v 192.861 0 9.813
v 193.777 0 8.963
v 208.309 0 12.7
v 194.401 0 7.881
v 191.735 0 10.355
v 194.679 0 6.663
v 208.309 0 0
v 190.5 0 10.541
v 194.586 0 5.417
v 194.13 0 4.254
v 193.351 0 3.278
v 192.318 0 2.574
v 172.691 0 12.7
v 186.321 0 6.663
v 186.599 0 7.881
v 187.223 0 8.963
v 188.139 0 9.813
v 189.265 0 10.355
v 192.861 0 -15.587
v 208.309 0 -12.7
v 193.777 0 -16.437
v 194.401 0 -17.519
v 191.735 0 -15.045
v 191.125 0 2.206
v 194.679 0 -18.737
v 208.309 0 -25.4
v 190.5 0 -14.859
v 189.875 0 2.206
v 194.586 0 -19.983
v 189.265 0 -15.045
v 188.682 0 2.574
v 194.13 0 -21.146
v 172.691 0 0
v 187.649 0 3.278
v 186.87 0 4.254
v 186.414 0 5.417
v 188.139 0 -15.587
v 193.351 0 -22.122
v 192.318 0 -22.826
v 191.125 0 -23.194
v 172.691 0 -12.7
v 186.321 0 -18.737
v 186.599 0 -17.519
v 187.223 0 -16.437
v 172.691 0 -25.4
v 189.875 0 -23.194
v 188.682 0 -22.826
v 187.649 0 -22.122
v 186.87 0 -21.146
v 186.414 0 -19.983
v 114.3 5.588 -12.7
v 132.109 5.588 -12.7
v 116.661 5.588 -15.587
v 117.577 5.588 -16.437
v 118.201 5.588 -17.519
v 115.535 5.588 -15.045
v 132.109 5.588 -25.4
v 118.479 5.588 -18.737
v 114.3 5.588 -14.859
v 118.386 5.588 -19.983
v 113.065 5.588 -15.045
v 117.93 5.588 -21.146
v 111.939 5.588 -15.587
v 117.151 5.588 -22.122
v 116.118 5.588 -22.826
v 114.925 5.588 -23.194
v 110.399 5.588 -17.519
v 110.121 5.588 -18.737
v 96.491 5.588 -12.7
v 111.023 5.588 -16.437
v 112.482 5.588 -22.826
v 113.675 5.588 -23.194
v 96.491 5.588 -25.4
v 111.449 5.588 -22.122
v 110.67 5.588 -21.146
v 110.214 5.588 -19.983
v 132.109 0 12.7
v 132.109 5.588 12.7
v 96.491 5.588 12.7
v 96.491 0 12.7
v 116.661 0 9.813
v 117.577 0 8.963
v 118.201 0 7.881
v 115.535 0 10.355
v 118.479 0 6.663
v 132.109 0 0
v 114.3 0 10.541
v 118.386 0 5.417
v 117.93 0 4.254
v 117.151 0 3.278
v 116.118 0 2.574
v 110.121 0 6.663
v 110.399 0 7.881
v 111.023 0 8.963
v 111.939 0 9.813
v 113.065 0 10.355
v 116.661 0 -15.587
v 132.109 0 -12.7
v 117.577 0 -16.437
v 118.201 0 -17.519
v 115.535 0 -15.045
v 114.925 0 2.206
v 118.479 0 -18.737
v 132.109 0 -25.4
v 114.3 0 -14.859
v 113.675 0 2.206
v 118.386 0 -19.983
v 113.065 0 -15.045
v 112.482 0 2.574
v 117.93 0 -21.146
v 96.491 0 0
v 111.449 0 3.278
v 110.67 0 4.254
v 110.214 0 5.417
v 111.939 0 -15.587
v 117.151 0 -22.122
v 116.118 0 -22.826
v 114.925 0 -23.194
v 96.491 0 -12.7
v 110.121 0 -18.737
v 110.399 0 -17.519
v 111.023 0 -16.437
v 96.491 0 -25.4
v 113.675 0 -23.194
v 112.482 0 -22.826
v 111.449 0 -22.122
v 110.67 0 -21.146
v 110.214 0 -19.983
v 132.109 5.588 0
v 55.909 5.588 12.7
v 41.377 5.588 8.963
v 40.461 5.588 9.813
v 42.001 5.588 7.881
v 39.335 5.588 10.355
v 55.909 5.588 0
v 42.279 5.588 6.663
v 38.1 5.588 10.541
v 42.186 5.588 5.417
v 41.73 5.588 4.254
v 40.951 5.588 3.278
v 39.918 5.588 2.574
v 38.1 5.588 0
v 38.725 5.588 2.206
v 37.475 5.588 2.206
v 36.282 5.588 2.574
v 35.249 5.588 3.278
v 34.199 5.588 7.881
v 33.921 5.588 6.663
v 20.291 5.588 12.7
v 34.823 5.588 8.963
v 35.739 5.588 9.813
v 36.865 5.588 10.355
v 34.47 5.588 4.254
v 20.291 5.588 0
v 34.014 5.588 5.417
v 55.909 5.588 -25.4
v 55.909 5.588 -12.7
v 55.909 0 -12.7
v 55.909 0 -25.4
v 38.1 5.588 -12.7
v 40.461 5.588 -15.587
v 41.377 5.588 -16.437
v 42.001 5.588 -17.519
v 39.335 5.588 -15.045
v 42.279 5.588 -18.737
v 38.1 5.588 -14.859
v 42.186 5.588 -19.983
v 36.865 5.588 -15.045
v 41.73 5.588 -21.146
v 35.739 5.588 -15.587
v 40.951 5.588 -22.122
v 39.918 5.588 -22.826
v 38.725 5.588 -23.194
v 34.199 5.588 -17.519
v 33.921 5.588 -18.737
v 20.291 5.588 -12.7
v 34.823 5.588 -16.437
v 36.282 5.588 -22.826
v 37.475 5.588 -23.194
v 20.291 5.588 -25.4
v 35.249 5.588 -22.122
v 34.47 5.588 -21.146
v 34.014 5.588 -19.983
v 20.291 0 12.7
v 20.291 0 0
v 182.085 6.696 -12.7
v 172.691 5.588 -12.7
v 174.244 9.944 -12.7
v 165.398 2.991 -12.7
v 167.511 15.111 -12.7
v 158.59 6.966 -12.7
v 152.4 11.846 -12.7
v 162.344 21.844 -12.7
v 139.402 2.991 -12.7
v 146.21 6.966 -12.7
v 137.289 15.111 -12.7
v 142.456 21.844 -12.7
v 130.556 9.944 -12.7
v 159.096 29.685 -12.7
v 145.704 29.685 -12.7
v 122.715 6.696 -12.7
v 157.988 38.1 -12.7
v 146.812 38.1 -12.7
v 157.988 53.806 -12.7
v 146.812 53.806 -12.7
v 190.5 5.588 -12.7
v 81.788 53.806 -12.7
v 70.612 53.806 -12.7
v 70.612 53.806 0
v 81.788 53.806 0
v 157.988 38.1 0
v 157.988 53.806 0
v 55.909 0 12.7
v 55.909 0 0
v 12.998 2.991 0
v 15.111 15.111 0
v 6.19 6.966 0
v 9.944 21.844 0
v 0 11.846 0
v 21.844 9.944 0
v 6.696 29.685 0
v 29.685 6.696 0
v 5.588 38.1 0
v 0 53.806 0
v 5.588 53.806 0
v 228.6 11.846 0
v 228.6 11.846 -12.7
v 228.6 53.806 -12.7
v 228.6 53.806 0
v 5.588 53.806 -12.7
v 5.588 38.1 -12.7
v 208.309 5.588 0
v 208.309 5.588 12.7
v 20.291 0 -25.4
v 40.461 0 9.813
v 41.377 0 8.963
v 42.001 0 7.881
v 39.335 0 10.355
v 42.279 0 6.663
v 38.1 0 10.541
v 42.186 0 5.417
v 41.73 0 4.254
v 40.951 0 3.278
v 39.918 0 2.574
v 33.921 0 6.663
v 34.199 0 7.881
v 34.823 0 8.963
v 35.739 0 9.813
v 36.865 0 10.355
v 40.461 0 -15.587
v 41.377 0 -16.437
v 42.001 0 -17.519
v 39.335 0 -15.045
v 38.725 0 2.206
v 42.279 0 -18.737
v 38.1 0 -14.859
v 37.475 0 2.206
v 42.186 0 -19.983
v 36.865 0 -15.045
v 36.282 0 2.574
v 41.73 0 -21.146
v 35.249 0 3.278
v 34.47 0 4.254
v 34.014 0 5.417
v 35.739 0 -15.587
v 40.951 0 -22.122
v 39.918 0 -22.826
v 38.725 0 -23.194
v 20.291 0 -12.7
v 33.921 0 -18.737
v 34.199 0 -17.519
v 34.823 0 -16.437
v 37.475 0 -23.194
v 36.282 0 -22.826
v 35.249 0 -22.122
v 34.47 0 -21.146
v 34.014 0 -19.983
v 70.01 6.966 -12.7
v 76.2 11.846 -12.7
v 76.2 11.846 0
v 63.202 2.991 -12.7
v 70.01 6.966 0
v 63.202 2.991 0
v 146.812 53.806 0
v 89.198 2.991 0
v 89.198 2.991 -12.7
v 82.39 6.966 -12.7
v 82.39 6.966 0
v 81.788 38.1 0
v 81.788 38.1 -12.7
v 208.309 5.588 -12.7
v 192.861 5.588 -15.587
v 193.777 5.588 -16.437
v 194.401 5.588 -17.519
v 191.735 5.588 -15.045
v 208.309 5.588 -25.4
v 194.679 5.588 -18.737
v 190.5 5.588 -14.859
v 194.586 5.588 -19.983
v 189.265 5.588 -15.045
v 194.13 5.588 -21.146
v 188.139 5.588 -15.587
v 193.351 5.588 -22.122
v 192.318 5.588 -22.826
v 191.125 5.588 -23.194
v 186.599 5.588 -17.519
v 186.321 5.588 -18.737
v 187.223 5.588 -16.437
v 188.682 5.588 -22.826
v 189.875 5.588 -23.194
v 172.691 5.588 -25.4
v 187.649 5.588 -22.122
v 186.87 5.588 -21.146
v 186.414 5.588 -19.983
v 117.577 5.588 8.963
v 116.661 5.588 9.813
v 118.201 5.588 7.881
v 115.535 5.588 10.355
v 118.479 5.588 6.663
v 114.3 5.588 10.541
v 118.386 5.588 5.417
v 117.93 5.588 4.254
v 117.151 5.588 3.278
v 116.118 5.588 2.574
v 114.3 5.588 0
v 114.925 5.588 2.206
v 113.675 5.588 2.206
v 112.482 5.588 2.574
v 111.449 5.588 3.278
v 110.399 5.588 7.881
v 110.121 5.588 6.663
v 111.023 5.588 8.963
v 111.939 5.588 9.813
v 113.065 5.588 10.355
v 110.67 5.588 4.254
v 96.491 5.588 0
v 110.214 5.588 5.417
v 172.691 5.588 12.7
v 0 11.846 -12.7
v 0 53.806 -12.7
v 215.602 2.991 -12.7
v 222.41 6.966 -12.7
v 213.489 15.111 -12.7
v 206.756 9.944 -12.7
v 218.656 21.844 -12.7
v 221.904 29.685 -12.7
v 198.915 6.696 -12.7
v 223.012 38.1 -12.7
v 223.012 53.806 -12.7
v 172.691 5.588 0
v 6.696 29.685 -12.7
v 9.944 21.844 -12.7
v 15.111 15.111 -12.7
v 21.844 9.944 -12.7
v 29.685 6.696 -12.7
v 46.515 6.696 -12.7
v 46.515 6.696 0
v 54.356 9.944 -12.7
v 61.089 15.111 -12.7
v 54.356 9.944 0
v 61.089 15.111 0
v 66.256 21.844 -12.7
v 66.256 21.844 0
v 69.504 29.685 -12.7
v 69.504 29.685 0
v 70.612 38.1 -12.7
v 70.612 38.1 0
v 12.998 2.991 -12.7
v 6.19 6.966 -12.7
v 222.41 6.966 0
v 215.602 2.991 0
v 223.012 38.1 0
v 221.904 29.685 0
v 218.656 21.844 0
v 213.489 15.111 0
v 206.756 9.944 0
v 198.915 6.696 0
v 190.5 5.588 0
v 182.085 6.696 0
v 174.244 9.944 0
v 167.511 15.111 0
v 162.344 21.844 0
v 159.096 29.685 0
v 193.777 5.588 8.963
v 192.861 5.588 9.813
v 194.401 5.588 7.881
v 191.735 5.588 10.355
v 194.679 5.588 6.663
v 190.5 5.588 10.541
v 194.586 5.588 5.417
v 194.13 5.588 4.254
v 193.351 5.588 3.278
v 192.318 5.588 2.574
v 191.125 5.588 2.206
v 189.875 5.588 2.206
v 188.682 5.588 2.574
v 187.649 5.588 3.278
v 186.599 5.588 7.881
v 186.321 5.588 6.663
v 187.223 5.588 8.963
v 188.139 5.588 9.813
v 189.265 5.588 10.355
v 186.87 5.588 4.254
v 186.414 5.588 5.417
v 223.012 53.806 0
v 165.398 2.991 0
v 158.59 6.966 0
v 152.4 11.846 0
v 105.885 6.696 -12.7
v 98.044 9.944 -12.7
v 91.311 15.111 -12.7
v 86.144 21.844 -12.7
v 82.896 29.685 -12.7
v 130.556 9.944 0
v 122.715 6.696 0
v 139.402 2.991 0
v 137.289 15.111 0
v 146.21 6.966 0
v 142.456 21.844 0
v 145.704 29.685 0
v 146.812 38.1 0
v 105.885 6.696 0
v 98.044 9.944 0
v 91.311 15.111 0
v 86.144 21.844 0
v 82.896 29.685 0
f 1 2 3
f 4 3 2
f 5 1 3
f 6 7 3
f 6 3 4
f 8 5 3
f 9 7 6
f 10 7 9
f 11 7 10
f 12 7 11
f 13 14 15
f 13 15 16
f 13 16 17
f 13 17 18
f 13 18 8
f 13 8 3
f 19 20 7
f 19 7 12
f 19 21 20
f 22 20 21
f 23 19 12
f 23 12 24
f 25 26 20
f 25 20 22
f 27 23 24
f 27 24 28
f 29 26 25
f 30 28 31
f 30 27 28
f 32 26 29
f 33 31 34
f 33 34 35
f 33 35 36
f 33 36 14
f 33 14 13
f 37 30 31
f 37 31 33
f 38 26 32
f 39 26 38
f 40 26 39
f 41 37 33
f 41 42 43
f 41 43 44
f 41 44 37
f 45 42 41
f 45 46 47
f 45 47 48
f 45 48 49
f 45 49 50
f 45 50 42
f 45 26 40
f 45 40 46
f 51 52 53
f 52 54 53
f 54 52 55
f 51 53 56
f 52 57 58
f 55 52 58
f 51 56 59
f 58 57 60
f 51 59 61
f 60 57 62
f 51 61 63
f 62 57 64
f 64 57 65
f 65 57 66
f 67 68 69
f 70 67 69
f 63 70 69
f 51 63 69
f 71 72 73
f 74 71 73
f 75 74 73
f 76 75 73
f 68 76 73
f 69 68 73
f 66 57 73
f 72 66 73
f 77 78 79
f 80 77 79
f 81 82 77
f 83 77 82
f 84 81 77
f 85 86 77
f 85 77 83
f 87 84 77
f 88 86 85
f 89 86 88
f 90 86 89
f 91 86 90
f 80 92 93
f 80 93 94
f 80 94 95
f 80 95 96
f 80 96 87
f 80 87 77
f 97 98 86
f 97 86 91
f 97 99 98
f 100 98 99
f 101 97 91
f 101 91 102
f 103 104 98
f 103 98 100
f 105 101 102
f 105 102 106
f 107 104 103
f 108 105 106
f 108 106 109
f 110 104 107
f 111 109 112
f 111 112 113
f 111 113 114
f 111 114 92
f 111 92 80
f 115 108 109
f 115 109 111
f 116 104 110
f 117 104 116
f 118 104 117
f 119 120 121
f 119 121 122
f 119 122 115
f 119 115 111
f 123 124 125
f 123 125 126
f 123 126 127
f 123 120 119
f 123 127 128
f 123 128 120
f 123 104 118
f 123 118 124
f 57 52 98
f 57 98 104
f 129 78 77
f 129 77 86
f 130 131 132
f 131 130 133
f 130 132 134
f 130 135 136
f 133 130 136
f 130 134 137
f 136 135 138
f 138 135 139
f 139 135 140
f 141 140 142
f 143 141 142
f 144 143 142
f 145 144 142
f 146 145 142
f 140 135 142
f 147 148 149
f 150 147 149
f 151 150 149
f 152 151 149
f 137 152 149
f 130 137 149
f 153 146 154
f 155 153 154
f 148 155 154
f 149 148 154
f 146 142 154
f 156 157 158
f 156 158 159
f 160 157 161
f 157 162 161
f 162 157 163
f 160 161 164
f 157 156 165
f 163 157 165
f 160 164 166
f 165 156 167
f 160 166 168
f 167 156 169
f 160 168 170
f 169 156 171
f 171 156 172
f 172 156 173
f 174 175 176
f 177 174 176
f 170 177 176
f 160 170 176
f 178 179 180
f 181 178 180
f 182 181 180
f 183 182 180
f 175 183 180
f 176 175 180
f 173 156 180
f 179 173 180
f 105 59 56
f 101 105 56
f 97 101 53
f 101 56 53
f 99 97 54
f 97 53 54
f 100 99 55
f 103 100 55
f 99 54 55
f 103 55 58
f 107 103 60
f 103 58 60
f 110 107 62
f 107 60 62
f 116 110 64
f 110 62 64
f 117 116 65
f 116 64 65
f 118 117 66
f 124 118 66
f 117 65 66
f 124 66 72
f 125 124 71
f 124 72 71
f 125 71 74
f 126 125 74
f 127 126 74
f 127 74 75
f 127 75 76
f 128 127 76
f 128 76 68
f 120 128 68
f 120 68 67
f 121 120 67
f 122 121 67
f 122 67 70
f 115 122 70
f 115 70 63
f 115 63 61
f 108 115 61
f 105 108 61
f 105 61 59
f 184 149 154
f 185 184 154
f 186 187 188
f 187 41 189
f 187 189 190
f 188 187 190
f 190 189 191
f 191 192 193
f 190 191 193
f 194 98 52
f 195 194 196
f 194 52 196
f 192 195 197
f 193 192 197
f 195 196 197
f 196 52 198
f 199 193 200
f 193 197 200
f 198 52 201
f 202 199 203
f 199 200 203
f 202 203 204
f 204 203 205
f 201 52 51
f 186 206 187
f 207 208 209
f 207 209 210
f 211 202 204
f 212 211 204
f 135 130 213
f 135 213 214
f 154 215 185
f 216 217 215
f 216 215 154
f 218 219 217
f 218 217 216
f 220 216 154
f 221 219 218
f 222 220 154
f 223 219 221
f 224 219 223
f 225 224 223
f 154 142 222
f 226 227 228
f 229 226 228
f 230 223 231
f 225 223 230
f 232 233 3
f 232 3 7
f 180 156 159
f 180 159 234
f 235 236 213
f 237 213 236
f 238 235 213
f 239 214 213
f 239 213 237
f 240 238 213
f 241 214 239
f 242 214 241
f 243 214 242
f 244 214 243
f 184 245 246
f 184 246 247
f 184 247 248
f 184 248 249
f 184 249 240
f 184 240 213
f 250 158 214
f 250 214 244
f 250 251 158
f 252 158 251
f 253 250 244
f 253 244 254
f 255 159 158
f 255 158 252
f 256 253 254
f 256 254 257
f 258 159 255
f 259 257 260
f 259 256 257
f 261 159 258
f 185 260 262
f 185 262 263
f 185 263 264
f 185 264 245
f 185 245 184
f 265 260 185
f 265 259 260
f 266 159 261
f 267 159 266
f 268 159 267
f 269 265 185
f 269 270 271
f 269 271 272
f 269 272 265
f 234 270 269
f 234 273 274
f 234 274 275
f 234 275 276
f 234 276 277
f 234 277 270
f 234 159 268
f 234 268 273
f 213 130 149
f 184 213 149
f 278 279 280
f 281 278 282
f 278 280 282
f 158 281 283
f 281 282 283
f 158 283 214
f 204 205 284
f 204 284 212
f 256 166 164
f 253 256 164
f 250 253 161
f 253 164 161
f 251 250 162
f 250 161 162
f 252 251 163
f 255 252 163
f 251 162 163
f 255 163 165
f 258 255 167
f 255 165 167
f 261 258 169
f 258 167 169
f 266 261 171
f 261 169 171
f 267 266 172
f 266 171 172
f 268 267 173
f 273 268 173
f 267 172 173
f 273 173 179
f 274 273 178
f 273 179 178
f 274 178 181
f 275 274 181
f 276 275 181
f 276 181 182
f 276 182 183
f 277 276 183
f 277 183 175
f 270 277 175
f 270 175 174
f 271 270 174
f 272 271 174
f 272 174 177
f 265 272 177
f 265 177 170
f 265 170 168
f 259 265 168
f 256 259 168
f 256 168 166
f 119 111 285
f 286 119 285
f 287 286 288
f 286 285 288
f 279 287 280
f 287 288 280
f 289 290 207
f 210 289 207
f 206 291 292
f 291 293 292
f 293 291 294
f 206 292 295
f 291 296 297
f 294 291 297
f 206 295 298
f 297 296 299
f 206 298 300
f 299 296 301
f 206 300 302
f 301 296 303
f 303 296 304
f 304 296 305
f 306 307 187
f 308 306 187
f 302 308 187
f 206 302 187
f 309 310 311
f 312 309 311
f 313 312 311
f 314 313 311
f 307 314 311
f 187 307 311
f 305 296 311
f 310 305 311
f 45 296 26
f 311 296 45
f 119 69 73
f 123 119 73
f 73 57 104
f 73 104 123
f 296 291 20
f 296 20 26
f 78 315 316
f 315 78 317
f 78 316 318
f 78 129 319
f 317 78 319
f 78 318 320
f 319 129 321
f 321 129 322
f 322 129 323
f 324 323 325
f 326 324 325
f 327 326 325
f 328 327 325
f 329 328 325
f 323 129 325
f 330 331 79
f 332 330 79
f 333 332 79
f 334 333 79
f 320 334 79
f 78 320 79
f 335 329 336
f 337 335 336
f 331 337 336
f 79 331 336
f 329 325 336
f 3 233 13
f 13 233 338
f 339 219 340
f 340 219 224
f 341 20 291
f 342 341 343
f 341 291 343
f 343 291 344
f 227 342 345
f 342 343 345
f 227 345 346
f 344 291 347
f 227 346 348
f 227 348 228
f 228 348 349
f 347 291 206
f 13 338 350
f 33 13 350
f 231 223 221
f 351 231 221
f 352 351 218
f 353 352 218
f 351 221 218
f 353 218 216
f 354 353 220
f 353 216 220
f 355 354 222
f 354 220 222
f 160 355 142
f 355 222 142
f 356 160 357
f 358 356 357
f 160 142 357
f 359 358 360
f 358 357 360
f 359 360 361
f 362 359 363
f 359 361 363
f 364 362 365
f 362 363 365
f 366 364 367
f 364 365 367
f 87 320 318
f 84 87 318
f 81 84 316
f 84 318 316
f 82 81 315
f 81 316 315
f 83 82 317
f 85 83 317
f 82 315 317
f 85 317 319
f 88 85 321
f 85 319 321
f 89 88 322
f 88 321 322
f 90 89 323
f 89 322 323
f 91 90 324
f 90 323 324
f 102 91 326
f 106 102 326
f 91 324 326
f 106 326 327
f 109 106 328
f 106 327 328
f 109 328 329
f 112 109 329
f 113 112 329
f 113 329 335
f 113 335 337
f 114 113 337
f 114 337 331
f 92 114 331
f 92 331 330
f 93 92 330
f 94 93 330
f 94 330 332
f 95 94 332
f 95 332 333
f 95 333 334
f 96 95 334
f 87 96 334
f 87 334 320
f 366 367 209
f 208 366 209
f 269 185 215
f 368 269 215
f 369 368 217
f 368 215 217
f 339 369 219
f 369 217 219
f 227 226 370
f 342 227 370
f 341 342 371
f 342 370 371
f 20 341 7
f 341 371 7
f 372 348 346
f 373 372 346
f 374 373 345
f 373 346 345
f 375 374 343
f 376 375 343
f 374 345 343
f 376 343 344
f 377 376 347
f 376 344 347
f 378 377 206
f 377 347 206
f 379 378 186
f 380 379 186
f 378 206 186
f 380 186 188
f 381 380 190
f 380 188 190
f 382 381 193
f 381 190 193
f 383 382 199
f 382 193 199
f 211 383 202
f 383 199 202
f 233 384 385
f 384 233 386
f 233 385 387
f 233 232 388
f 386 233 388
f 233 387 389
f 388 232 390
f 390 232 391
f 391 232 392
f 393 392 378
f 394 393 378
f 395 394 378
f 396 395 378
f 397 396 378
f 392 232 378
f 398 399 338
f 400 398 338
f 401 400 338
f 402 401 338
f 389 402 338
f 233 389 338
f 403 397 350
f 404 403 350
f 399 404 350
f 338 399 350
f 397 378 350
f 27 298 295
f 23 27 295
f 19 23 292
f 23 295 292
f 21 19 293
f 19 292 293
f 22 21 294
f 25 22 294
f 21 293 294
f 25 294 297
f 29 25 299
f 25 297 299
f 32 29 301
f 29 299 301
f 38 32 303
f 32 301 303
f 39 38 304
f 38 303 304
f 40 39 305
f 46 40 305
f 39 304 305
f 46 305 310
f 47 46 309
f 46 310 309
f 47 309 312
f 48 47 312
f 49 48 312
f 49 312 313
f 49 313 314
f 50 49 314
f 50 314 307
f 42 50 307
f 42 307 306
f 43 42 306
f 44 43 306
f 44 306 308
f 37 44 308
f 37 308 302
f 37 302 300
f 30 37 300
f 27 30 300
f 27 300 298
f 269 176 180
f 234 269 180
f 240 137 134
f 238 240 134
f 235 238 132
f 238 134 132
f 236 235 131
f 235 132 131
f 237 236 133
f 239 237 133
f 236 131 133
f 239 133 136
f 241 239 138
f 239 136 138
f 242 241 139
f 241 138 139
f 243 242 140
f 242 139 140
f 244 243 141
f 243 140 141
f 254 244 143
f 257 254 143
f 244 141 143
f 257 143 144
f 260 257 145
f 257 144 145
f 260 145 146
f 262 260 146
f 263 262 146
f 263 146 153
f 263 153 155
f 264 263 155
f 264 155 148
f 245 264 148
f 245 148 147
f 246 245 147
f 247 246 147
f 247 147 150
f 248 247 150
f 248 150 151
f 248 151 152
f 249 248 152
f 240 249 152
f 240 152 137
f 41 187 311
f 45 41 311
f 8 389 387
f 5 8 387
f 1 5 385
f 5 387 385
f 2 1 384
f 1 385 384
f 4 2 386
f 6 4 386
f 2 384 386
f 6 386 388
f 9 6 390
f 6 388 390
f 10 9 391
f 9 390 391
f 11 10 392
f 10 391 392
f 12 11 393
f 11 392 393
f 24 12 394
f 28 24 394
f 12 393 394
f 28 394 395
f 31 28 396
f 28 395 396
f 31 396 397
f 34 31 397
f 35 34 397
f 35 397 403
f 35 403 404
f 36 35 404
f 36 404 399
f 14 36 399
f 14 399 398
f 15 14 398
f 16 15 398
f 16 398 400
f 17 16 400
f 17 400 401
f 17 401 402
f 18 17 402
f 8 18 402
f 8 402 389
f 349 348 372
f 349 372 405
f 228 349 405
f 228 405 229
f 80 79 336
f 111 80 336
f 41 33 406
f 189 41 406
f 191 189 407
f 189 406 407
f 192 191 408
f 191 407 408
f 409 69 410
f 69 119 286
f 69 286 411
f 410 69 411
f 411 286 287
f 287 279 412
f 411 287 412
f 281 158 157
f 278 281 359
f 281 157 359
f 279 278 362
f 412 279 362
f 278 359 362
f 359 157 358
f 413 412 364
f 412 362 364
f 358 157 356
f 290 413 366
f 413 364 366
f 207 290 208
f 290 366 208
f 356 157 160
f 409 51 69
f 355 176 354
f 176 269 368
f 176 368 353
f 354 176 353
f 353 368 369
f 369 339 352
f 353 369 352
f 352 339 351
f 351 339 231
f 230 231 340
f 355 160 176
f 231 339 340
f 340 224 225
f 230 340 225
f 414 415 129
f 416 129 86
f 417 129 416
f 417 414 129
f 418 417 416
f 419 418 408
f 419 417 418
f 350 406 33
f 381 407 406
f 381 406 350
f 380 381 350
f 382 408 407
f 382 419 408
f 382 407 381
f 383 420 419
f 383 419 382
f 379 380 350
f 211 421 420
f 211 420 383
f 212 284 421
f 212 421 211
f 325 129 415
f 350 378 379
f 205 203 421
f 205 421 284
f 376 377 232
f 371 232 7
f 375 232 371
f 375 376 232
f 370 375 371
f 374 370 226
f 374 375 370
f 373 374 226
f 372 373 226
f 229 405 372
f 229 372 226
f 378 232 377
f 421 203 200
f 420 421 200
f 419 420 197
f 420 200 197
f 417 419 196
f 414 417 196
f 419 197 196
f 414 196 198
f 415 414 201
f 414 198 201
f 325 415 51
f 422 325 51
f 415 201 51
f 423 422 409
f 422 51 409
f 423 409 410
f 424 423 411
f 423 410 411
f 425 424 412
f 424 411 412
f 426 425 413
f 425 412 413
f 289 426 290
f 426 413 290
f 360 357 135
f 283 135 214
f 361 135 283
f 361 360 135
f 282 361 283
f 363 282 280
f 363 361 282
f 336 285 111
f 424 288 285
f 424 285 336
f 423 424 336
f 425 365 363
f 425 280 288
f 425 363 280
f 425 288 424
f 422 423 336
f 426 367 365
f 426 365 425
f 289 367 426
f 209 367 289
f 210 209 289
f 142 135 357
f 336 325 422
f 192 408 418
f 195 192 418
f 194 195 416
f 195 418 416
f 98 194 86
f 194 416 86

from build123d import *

# Parameters (mm, degrees)
SKETCH1_W               = 76.2
SKETCH1_H               = 228.6
BOSS_EXTRUDE1_DEPTH     = 38.1
SKETCH2_R               = 32.512
CUT_EXTRUDE2_DEPTH      = 244.959033446
SKETCH3_W               = 5.588
SKETCH3_H               = 15.705533419
BOSS_EXTRUDE2_DEPTH     = 228.6
SKETCH4_W               = 8.89
SKETCH4_H               = 5.08
CUT_EXTRUDE3_DEPTH      = 247.899646469
CRVPATTERN1_START       = -228.6
CRVPATTERN1_OUTLINE_W   = 5.588
CRVPATTERN1_OUTLINE_H   = 5.312766709
CRVPATTERN1_DEPTH       = 228.6
CRVPATTERN1_START_2     = -165.1
CRVPATTERN1_2_OUTLINE_W = 5.588
CRVPATTERN1_2_OUTLINE_H = 5.08
CRVPATTERN1_2_DEPTH     = 101.6
CRVPATTERN1_3_OUTLINE_W = 5.588
CRVPATTERN1_3_OUTLINE_H = 5.08
CRVPATTERN1_3_DEPTH     = 54.61
CRVPATTERN1_START_3     = -54.61
CRVPATTERN1_4_OUTLINE_W = 5.588
CRVPATTERN1_4_OUTLINE_H = 5.08
CRVPATTERN1_4_DEPTH     = 54.61
CRVPATTERN1_5_OUTLINE_W = 5.588
CRVPATTERN1_5_OUTLINE_H = 5.312766709
CRVPATTERN1_5_DEPTH     = 228.6
CRVPATTERN1_6_OUTLINE_W = 5.588
CRVPATTERN1_6_OUTLINE_H = 5.08
CRVPATTERN1_6_DEPTH     = 101.6
CRVPATTERN1_7_OUTLINE_W = 5.588
CRVPATTERN1_7_OUTLINE_H = 5.08
CRVPATTERN1_7_DEPTH     = 54.61
CRVPATTERN1_8_OUTLINE_W = 5.588
CRVPATTERN1_8_OUTLINE_H = 5.08
CRVPATTERN1_8_DEPTH     = 54.61
SKETCH6_W               = 215.9
SKETCH6_H               = 53.805533419
CUT_EXTRUDE4_DEPTH      = 328.736106382
CUT_EXTRUDE5_DEPTH      = 236.189892271
BOSS_EXTRUDE4_START     = -5.588
SKETCH8_W               = 35.618239262
SKETCH8_H               = 38.1
BOSS_EXTRUDE4_DEPTH     = 5.588
SKETCH9_R               = 4.191
CUT_EXTRUDE6_DEPTH      = 236.006490398


# Read off the part's stored shape, not the designer's step: CrvPattern1
with BuildPart() as part:
    # Sketch1 → Boss-Extrude1 (new body)
    with BuildSketch(Plane(origin=(0, 0, 0), x_dir=(1, 0, 0), z_dir=(0, 1, 0))):
        with Locations((38.1, 114.3)):
            Rectangle(SKETCH1_W, SKETCH1_H)
    extrude(amount=BOSS_EXTRUDE1_DEPTH)

    # Sketch2 → Cut-Extrude2 (cut, through all)
    with BuildSketch(Plane.XY):
        with Locations((38.1, 38.1)):
            Circle(SKETCH2_R)
    extrude(amount=-CUT_EXTRUDE2_DEPTH, mode=Mode.SUBTRACT)

    # Sketch3 → Boss-Extrude2 (add)
    with BuildSketch(Plane.XY):
        with Locations((2.794, 45.95276671)):
            Rectangle(SKETCH3_W, SKETCH3_H)
        with Locations((73.406, 45.95276671)):
            Rectangle(SKETCH3_W, SKETCH3_H)
    extrude(amount=-BOSS_EXTRUDE2_DEPTH)

    # Sketch4 → Cut-Extrude3 (cut, through all)
    with BuildSketch(Plane(origin=(76.2, 0, 0), x_dir=(0, 0, -1), z_dir=(1, 0, 0))):
        with Locations((59.055, 45.95276671)):
            Rectangle(SKETCH4_W, SKETCH4_H)
        with Locations((169.545, 45.95276671)):
            Rectangle(SKETCH4_W, SKETCH4_H)
    extrude(amount=-CUT_EXTRUDE3_DEPTH, mode=Mode.SUBTRACT)


with BuildPart() as body_2:
    # CrvPattern1 outline → CrvPattern1 (new body)
    with BuildSketch(Plane.XY.offset(CRVPATTERN1_START)):
        with BuildLine():
            Line((152.4, 43.41276671), (152.4, 0))
            Line((152.4, 0), (228.6, 0))
            Line((228.6, 0), (228.6, 43.41276671))
            Line((228.6, 43.41276671), (223.012, 43.41276671))
            Line((223.012, 43.41276671), (223.012, 38.1))
            ThreePointArc((223.012, 38.1), (190.5, 5.588), (157.988, 38.1))
            Line((157.988, 38.1), (157.988, 43.41276671))
            Line((157.988, 43.41276671), (152.4, 43.41276671))
        make_face()
        with Locations((155.194, 51.149150065)):
            Rectangle(CRVPATTERN1_OUTLINE_W, CRVPATTERN1_OUTLINE_H)
        with Locations((225.806, 51.149150065)):
            Rectangle(CRVPATTERN1_OUTLINE_W, CRVPATTERN1_OUTLINE_H)
    extrude(amount=CRVPATTERN1_DEPTH)

    # CrvPattern1 2 outline → CrvPattern1 2 (add)
    with BuildSketch(Plane.XY.offset(CRVPATTERN1_START_2)):
        with Locations((155.194, 45.95276671)):
            Rectangle(CRVPATTERN1_2_OUTLINE_W, CRVPATTERN1_2_OUTLINE_H)
        with Locations((225.806, 45.95276671)):
            Rectangle(CRVPATTERN1_2_OUTLINE_W, CRVPATTERN1_2_OUTLINE_H)
    extrude(amount=CRVPATTERN1_2_DEPTH)

    # CrvPattern1 3 outline → CrvPattern1 3 (add)
    with BuildSketch(Plane.XY.offset(CRVPATTERN1_START)):
        with Locations((155.194, 45.95276671)):
            Rectangle(CRVPATTERN1_3_OUTLINE_W, CRVPATTERN1_3_OUTLINE_H)
        with Locations((225.806, 45.95276671)):
            Rectangle(CRVPATTERN1_3_OUTLINE_W, CRVPATTERN1_3_OUTLINE_H)
    extrude(amount=CRVPATTERN1_3_DEPTH)

    # CrvPattern1 4 outline → CrvPattern1 4 (add)
    with BuildSketch(Plane.XY.offset(CRVPATTERN1_START_3)):
        with Locations((155.194, 45.95276671)):
            Rectangle(CRVPATTERN1_4_OUTLINE_W, CRVPATTERN1_4_OUTLINE_H)
        with Locations((225.806, 45.95276671)):
            Rectangle(CRVPATTERN1_4_OUTLINE_W, CRVPATTERN1_4_OUTLINE_H)
    extrude(amount=CRVPATTERN1_4_DEPTH)


with BuildPart() as body_3:
    # CrvPattern1 5 outline → CrvPattern1 5 (new body)
    with BuildSketch(Plane.XY.offset(CRVPATTERN1_START)):
        with BuildLine():
            Line((76.2, 43.41276671), (76.2, 0))
            Line((76.2, 0), (152.4, 0))
            Line((152.4, 0), (152.4, 43.41276671))
            Line((152.4, 43.41276671), (146.812, 43.41276671))
            Line((146.812, 43.41276671), (146.812, 38.1))
            ThreePointArc((146.812, 38.1), (114.3, 5.588), (81.788, 38.1))
            Line((81.788, 38.1), (81.788, 43.41276671))
            Line((81.788, 43.41276671), (76.2, 43.41276671))
        make_face()
        with Locations((78.994, 51.149150065)):
            Rectangle(CRVPATTERN1_5_OUTLINE_W, CRVPATTERN1_5_OUTLINE_H)
        with Locations((149.606, 51.149150065)):
            Rectangle(CRVPATTERN1_5_OUTLINE_W, CRVPATTERN1_5_OUTLINE_H)
    extrude(amount=CRVPATTERN1_5_DEPTH)

    # CrvPattern1 6 outline → CrvPattern1 6 (add)
    with BuildSketch(Plane.XY.offset(CRVPATTERN1_START_2)):
        with Locations((78.994, 45.95276671)):
            Rectangle(CRVPATTERN1_6_OUTLINE_W, CRVPATTERN1_6_OUTLINE_H)
        with Locations((149.606, 45.95276671)):
            Rectangle(CRVPATTERN1_6_OUTLINE_W, CRVPATTERN1_6_OUTLINE_H)
    extrude(amount=CRVPATTERN1_6_DEPTH)

    # CrvPattern1 7 outline → CrvPattern1 7 (add)
    with BuildSketch(Plane.XY.offset(CRVPATTERN1_START)):
        with Locations((78.994, 45.95276671)):
            Rectangle(CRVPATTERN1_7_OUTLINE_W, CRVPATTERN1_7_OUTLINE_H)
        with Locations((149.606, 45.95276671)):
            Rectangle(CRVPATTERN1_7_OUTLINE_W, CRVPATTERN1_7_OUTLINE_H)
    extrude(amount=CRVPATTERN1_7_DEPTH)

    # CrvPattern1 8 outline → CrvPattern1 8 (add)
    with BuildSketch(Plane.XY.offset(CRVPATTERN1_START_3)):
        with Locations((78.994, 45.95276671)):
            Rectangle(CRVPATTERN1_8_OUTLINE_W, CRVPATTERN1_8_OUTLINE_H)
        with Locations((149.606, 45.95276671)):
            Rectangle(CRVPATTERN1_8_OUTLINE_W, CRVPATTERN1_8_OUTLINE_H)
    extrude(amount=CRVPATTERN1_8_DEPTH)


with BuildPart() as cut_extrude4_tool:
    # Sketch6 → Cut-Extrude4 (new, through all)
    with BuildSketch(Plane.ZY):
        with Locations((-120.65, 26.90276671)):
            Rectangle(SKETCH6_W, SKETCH6_H)
    extrude(amount=-CUT_EXTRUDE4_DEPTH)


with BuildPart() as part_1:
    add(part.part)

    # Cut-Extrude4: cut by cut_extrude4_tool
    add(cut_extrude4_tool.part, mode=Mode.SUBTRACT)


with BuildPart() as body_2_1:
    add(body_2.part)

    # Cut-Extrude4: cut by cut_extrude4_tool
    add(cut_extrude4_tool.part, mode=Mode.SUBTRACT)


with BuildPart() as body_3_1:
    add(body_3.part)

    # Cut-Extrude4: cut by cut_extrude4_tool
    add(cut_extrude4_tool.part, mode=Mode.SUBTRACT)


with BuildPart() as cut_extrude5_tool:
    # Sketch7 → Cut-Extrude5 (new, through all)
    with BuildSketch(Plane.XY):
        with BuildLine():
            Line((0, 0), (20.290880369, 0))
            ThreePointArc((20.290880369, 0), (9.524832285, 4.860053969), (0, 11.846146286))
            Line((0, 11.846146286), (0, 0))
        make_face()
        with BuildLine():
            Line((228.6, 0), (228.6, 11.846146286))
            ThreePointArc((228.6, 11.846146286), (219.075167715, 4.860053969), (208.309119631, 0))
            Line((208.309119631, 0), (228.6, 0))
        make_face()
        with BuildLine():
            Line((55.909119631, 0), (96.490880369, 0))
            ThreePointArc((96.490880369, 0), (85.724832285, 4.860053969), (76.2, 11.846146286))
            ThreePointArc((76.2, 11.846146286), (66.675167715, 4.860053969), (55.909119631, 0))
        make_face()
        with BuildLine():
            Line((132.109119631, 0), (172.690880369, 0))
            ThreePointArc((172.690880369, 0), (161.924832285, 4.860053969), (152.4, 11.846146286))
            ThreePointArc((152.4, 11.846146286), (142.875167715, 4.860053969), (132.109119631, 0))
        make_face()
    extrude(amount=-CUT_EXTRUDE5_DEPTH)


with BuildPart() as part_2:
    add(part_1.part)

    # Cut-Extrude5: cut by cut_extrude5_tool
    add(cut_extrude5_tool.part, mode=Mode.SUBTRACT)



with BuildPart() as body_2_2:
    add(body_2_1.part)

    # Cut-Extrude5: cut by cut_extrude5_tool
    add(cut_extrude5_tool.part, mode=Mode.SUBTRACT)


with BuildPart() as body_3_2:
    add(body_3_1.part)

    # Cut-Extrude5: cut by cut_extrude5_tool
    add(cut_extrude5_tool.part, mode=Mode.SUBTRACT)


with BuildPart() as part_3:
    add(part_2.part)

    add(body_2_2.part)  # Boss-Extrude4 merges body 2

    add(body_3_2.part)  # Boss-Extrude4 merges body 3
    # Sketch8 → Boss-Extrude4 (add)
    with BuildSketch(Plane(origin=(0, 0, 0), x_dir=(-1, 0, 0), z_dir=(0, -1, 0)).offset(BOSS_EXTRUDE4_START)):
        with Locations((-38.1, 6.35)):
            Rectangle(SKETCH8_W, SKETCH8_H)
        with Locations((-114.3, 6.35)):
            Rectangle(SKETCH8_W, SKETCH8_H)
        with Locations((-190.5, 6.35)):
            Rectangle(SKETCH8_W, SKETCH8_H)
    extrude(amount=BOSS_EXTRUDE4_DEPTH)

    # Sketch9 → Cut-Extrude6 (cut, through all)
    with BuildSketch(Plane(origin=(0, 5.588, 0), x_dir=(1, 0, 0), z_dir=(0, 1, 0))):
        with Locations(Location((38.1, 19.05, 0), (0, 0, 270))):
            Circle(SKETCH9_R)
        with Locations(Location((114.3, 19.05, 0), (0, 0, 270))):
            Circle(SKETCH9_R)
        with Locations(Location((190.5, 19.05, 0), (0, 0, 270))):
            Circle(SKETCH9_R)
        with Locations(Location((114.3, -6.35, 0), (0, 0, 270))):
            Circle(SKETCH9_R)
        with Locations(Location((190.5, -6.35, 0), (0, 0, 270))):
            Circle(SKETCH9_R)
        with Locations(Location((38.1, -6.35, 0), (0, 0, 270))):
            Circle(SKETCH9_R)
    extrude(amount=-CUT_EXTRUDE6_DEPTH, mode=Mode.SUBTRACT)


solid = part_3.part
